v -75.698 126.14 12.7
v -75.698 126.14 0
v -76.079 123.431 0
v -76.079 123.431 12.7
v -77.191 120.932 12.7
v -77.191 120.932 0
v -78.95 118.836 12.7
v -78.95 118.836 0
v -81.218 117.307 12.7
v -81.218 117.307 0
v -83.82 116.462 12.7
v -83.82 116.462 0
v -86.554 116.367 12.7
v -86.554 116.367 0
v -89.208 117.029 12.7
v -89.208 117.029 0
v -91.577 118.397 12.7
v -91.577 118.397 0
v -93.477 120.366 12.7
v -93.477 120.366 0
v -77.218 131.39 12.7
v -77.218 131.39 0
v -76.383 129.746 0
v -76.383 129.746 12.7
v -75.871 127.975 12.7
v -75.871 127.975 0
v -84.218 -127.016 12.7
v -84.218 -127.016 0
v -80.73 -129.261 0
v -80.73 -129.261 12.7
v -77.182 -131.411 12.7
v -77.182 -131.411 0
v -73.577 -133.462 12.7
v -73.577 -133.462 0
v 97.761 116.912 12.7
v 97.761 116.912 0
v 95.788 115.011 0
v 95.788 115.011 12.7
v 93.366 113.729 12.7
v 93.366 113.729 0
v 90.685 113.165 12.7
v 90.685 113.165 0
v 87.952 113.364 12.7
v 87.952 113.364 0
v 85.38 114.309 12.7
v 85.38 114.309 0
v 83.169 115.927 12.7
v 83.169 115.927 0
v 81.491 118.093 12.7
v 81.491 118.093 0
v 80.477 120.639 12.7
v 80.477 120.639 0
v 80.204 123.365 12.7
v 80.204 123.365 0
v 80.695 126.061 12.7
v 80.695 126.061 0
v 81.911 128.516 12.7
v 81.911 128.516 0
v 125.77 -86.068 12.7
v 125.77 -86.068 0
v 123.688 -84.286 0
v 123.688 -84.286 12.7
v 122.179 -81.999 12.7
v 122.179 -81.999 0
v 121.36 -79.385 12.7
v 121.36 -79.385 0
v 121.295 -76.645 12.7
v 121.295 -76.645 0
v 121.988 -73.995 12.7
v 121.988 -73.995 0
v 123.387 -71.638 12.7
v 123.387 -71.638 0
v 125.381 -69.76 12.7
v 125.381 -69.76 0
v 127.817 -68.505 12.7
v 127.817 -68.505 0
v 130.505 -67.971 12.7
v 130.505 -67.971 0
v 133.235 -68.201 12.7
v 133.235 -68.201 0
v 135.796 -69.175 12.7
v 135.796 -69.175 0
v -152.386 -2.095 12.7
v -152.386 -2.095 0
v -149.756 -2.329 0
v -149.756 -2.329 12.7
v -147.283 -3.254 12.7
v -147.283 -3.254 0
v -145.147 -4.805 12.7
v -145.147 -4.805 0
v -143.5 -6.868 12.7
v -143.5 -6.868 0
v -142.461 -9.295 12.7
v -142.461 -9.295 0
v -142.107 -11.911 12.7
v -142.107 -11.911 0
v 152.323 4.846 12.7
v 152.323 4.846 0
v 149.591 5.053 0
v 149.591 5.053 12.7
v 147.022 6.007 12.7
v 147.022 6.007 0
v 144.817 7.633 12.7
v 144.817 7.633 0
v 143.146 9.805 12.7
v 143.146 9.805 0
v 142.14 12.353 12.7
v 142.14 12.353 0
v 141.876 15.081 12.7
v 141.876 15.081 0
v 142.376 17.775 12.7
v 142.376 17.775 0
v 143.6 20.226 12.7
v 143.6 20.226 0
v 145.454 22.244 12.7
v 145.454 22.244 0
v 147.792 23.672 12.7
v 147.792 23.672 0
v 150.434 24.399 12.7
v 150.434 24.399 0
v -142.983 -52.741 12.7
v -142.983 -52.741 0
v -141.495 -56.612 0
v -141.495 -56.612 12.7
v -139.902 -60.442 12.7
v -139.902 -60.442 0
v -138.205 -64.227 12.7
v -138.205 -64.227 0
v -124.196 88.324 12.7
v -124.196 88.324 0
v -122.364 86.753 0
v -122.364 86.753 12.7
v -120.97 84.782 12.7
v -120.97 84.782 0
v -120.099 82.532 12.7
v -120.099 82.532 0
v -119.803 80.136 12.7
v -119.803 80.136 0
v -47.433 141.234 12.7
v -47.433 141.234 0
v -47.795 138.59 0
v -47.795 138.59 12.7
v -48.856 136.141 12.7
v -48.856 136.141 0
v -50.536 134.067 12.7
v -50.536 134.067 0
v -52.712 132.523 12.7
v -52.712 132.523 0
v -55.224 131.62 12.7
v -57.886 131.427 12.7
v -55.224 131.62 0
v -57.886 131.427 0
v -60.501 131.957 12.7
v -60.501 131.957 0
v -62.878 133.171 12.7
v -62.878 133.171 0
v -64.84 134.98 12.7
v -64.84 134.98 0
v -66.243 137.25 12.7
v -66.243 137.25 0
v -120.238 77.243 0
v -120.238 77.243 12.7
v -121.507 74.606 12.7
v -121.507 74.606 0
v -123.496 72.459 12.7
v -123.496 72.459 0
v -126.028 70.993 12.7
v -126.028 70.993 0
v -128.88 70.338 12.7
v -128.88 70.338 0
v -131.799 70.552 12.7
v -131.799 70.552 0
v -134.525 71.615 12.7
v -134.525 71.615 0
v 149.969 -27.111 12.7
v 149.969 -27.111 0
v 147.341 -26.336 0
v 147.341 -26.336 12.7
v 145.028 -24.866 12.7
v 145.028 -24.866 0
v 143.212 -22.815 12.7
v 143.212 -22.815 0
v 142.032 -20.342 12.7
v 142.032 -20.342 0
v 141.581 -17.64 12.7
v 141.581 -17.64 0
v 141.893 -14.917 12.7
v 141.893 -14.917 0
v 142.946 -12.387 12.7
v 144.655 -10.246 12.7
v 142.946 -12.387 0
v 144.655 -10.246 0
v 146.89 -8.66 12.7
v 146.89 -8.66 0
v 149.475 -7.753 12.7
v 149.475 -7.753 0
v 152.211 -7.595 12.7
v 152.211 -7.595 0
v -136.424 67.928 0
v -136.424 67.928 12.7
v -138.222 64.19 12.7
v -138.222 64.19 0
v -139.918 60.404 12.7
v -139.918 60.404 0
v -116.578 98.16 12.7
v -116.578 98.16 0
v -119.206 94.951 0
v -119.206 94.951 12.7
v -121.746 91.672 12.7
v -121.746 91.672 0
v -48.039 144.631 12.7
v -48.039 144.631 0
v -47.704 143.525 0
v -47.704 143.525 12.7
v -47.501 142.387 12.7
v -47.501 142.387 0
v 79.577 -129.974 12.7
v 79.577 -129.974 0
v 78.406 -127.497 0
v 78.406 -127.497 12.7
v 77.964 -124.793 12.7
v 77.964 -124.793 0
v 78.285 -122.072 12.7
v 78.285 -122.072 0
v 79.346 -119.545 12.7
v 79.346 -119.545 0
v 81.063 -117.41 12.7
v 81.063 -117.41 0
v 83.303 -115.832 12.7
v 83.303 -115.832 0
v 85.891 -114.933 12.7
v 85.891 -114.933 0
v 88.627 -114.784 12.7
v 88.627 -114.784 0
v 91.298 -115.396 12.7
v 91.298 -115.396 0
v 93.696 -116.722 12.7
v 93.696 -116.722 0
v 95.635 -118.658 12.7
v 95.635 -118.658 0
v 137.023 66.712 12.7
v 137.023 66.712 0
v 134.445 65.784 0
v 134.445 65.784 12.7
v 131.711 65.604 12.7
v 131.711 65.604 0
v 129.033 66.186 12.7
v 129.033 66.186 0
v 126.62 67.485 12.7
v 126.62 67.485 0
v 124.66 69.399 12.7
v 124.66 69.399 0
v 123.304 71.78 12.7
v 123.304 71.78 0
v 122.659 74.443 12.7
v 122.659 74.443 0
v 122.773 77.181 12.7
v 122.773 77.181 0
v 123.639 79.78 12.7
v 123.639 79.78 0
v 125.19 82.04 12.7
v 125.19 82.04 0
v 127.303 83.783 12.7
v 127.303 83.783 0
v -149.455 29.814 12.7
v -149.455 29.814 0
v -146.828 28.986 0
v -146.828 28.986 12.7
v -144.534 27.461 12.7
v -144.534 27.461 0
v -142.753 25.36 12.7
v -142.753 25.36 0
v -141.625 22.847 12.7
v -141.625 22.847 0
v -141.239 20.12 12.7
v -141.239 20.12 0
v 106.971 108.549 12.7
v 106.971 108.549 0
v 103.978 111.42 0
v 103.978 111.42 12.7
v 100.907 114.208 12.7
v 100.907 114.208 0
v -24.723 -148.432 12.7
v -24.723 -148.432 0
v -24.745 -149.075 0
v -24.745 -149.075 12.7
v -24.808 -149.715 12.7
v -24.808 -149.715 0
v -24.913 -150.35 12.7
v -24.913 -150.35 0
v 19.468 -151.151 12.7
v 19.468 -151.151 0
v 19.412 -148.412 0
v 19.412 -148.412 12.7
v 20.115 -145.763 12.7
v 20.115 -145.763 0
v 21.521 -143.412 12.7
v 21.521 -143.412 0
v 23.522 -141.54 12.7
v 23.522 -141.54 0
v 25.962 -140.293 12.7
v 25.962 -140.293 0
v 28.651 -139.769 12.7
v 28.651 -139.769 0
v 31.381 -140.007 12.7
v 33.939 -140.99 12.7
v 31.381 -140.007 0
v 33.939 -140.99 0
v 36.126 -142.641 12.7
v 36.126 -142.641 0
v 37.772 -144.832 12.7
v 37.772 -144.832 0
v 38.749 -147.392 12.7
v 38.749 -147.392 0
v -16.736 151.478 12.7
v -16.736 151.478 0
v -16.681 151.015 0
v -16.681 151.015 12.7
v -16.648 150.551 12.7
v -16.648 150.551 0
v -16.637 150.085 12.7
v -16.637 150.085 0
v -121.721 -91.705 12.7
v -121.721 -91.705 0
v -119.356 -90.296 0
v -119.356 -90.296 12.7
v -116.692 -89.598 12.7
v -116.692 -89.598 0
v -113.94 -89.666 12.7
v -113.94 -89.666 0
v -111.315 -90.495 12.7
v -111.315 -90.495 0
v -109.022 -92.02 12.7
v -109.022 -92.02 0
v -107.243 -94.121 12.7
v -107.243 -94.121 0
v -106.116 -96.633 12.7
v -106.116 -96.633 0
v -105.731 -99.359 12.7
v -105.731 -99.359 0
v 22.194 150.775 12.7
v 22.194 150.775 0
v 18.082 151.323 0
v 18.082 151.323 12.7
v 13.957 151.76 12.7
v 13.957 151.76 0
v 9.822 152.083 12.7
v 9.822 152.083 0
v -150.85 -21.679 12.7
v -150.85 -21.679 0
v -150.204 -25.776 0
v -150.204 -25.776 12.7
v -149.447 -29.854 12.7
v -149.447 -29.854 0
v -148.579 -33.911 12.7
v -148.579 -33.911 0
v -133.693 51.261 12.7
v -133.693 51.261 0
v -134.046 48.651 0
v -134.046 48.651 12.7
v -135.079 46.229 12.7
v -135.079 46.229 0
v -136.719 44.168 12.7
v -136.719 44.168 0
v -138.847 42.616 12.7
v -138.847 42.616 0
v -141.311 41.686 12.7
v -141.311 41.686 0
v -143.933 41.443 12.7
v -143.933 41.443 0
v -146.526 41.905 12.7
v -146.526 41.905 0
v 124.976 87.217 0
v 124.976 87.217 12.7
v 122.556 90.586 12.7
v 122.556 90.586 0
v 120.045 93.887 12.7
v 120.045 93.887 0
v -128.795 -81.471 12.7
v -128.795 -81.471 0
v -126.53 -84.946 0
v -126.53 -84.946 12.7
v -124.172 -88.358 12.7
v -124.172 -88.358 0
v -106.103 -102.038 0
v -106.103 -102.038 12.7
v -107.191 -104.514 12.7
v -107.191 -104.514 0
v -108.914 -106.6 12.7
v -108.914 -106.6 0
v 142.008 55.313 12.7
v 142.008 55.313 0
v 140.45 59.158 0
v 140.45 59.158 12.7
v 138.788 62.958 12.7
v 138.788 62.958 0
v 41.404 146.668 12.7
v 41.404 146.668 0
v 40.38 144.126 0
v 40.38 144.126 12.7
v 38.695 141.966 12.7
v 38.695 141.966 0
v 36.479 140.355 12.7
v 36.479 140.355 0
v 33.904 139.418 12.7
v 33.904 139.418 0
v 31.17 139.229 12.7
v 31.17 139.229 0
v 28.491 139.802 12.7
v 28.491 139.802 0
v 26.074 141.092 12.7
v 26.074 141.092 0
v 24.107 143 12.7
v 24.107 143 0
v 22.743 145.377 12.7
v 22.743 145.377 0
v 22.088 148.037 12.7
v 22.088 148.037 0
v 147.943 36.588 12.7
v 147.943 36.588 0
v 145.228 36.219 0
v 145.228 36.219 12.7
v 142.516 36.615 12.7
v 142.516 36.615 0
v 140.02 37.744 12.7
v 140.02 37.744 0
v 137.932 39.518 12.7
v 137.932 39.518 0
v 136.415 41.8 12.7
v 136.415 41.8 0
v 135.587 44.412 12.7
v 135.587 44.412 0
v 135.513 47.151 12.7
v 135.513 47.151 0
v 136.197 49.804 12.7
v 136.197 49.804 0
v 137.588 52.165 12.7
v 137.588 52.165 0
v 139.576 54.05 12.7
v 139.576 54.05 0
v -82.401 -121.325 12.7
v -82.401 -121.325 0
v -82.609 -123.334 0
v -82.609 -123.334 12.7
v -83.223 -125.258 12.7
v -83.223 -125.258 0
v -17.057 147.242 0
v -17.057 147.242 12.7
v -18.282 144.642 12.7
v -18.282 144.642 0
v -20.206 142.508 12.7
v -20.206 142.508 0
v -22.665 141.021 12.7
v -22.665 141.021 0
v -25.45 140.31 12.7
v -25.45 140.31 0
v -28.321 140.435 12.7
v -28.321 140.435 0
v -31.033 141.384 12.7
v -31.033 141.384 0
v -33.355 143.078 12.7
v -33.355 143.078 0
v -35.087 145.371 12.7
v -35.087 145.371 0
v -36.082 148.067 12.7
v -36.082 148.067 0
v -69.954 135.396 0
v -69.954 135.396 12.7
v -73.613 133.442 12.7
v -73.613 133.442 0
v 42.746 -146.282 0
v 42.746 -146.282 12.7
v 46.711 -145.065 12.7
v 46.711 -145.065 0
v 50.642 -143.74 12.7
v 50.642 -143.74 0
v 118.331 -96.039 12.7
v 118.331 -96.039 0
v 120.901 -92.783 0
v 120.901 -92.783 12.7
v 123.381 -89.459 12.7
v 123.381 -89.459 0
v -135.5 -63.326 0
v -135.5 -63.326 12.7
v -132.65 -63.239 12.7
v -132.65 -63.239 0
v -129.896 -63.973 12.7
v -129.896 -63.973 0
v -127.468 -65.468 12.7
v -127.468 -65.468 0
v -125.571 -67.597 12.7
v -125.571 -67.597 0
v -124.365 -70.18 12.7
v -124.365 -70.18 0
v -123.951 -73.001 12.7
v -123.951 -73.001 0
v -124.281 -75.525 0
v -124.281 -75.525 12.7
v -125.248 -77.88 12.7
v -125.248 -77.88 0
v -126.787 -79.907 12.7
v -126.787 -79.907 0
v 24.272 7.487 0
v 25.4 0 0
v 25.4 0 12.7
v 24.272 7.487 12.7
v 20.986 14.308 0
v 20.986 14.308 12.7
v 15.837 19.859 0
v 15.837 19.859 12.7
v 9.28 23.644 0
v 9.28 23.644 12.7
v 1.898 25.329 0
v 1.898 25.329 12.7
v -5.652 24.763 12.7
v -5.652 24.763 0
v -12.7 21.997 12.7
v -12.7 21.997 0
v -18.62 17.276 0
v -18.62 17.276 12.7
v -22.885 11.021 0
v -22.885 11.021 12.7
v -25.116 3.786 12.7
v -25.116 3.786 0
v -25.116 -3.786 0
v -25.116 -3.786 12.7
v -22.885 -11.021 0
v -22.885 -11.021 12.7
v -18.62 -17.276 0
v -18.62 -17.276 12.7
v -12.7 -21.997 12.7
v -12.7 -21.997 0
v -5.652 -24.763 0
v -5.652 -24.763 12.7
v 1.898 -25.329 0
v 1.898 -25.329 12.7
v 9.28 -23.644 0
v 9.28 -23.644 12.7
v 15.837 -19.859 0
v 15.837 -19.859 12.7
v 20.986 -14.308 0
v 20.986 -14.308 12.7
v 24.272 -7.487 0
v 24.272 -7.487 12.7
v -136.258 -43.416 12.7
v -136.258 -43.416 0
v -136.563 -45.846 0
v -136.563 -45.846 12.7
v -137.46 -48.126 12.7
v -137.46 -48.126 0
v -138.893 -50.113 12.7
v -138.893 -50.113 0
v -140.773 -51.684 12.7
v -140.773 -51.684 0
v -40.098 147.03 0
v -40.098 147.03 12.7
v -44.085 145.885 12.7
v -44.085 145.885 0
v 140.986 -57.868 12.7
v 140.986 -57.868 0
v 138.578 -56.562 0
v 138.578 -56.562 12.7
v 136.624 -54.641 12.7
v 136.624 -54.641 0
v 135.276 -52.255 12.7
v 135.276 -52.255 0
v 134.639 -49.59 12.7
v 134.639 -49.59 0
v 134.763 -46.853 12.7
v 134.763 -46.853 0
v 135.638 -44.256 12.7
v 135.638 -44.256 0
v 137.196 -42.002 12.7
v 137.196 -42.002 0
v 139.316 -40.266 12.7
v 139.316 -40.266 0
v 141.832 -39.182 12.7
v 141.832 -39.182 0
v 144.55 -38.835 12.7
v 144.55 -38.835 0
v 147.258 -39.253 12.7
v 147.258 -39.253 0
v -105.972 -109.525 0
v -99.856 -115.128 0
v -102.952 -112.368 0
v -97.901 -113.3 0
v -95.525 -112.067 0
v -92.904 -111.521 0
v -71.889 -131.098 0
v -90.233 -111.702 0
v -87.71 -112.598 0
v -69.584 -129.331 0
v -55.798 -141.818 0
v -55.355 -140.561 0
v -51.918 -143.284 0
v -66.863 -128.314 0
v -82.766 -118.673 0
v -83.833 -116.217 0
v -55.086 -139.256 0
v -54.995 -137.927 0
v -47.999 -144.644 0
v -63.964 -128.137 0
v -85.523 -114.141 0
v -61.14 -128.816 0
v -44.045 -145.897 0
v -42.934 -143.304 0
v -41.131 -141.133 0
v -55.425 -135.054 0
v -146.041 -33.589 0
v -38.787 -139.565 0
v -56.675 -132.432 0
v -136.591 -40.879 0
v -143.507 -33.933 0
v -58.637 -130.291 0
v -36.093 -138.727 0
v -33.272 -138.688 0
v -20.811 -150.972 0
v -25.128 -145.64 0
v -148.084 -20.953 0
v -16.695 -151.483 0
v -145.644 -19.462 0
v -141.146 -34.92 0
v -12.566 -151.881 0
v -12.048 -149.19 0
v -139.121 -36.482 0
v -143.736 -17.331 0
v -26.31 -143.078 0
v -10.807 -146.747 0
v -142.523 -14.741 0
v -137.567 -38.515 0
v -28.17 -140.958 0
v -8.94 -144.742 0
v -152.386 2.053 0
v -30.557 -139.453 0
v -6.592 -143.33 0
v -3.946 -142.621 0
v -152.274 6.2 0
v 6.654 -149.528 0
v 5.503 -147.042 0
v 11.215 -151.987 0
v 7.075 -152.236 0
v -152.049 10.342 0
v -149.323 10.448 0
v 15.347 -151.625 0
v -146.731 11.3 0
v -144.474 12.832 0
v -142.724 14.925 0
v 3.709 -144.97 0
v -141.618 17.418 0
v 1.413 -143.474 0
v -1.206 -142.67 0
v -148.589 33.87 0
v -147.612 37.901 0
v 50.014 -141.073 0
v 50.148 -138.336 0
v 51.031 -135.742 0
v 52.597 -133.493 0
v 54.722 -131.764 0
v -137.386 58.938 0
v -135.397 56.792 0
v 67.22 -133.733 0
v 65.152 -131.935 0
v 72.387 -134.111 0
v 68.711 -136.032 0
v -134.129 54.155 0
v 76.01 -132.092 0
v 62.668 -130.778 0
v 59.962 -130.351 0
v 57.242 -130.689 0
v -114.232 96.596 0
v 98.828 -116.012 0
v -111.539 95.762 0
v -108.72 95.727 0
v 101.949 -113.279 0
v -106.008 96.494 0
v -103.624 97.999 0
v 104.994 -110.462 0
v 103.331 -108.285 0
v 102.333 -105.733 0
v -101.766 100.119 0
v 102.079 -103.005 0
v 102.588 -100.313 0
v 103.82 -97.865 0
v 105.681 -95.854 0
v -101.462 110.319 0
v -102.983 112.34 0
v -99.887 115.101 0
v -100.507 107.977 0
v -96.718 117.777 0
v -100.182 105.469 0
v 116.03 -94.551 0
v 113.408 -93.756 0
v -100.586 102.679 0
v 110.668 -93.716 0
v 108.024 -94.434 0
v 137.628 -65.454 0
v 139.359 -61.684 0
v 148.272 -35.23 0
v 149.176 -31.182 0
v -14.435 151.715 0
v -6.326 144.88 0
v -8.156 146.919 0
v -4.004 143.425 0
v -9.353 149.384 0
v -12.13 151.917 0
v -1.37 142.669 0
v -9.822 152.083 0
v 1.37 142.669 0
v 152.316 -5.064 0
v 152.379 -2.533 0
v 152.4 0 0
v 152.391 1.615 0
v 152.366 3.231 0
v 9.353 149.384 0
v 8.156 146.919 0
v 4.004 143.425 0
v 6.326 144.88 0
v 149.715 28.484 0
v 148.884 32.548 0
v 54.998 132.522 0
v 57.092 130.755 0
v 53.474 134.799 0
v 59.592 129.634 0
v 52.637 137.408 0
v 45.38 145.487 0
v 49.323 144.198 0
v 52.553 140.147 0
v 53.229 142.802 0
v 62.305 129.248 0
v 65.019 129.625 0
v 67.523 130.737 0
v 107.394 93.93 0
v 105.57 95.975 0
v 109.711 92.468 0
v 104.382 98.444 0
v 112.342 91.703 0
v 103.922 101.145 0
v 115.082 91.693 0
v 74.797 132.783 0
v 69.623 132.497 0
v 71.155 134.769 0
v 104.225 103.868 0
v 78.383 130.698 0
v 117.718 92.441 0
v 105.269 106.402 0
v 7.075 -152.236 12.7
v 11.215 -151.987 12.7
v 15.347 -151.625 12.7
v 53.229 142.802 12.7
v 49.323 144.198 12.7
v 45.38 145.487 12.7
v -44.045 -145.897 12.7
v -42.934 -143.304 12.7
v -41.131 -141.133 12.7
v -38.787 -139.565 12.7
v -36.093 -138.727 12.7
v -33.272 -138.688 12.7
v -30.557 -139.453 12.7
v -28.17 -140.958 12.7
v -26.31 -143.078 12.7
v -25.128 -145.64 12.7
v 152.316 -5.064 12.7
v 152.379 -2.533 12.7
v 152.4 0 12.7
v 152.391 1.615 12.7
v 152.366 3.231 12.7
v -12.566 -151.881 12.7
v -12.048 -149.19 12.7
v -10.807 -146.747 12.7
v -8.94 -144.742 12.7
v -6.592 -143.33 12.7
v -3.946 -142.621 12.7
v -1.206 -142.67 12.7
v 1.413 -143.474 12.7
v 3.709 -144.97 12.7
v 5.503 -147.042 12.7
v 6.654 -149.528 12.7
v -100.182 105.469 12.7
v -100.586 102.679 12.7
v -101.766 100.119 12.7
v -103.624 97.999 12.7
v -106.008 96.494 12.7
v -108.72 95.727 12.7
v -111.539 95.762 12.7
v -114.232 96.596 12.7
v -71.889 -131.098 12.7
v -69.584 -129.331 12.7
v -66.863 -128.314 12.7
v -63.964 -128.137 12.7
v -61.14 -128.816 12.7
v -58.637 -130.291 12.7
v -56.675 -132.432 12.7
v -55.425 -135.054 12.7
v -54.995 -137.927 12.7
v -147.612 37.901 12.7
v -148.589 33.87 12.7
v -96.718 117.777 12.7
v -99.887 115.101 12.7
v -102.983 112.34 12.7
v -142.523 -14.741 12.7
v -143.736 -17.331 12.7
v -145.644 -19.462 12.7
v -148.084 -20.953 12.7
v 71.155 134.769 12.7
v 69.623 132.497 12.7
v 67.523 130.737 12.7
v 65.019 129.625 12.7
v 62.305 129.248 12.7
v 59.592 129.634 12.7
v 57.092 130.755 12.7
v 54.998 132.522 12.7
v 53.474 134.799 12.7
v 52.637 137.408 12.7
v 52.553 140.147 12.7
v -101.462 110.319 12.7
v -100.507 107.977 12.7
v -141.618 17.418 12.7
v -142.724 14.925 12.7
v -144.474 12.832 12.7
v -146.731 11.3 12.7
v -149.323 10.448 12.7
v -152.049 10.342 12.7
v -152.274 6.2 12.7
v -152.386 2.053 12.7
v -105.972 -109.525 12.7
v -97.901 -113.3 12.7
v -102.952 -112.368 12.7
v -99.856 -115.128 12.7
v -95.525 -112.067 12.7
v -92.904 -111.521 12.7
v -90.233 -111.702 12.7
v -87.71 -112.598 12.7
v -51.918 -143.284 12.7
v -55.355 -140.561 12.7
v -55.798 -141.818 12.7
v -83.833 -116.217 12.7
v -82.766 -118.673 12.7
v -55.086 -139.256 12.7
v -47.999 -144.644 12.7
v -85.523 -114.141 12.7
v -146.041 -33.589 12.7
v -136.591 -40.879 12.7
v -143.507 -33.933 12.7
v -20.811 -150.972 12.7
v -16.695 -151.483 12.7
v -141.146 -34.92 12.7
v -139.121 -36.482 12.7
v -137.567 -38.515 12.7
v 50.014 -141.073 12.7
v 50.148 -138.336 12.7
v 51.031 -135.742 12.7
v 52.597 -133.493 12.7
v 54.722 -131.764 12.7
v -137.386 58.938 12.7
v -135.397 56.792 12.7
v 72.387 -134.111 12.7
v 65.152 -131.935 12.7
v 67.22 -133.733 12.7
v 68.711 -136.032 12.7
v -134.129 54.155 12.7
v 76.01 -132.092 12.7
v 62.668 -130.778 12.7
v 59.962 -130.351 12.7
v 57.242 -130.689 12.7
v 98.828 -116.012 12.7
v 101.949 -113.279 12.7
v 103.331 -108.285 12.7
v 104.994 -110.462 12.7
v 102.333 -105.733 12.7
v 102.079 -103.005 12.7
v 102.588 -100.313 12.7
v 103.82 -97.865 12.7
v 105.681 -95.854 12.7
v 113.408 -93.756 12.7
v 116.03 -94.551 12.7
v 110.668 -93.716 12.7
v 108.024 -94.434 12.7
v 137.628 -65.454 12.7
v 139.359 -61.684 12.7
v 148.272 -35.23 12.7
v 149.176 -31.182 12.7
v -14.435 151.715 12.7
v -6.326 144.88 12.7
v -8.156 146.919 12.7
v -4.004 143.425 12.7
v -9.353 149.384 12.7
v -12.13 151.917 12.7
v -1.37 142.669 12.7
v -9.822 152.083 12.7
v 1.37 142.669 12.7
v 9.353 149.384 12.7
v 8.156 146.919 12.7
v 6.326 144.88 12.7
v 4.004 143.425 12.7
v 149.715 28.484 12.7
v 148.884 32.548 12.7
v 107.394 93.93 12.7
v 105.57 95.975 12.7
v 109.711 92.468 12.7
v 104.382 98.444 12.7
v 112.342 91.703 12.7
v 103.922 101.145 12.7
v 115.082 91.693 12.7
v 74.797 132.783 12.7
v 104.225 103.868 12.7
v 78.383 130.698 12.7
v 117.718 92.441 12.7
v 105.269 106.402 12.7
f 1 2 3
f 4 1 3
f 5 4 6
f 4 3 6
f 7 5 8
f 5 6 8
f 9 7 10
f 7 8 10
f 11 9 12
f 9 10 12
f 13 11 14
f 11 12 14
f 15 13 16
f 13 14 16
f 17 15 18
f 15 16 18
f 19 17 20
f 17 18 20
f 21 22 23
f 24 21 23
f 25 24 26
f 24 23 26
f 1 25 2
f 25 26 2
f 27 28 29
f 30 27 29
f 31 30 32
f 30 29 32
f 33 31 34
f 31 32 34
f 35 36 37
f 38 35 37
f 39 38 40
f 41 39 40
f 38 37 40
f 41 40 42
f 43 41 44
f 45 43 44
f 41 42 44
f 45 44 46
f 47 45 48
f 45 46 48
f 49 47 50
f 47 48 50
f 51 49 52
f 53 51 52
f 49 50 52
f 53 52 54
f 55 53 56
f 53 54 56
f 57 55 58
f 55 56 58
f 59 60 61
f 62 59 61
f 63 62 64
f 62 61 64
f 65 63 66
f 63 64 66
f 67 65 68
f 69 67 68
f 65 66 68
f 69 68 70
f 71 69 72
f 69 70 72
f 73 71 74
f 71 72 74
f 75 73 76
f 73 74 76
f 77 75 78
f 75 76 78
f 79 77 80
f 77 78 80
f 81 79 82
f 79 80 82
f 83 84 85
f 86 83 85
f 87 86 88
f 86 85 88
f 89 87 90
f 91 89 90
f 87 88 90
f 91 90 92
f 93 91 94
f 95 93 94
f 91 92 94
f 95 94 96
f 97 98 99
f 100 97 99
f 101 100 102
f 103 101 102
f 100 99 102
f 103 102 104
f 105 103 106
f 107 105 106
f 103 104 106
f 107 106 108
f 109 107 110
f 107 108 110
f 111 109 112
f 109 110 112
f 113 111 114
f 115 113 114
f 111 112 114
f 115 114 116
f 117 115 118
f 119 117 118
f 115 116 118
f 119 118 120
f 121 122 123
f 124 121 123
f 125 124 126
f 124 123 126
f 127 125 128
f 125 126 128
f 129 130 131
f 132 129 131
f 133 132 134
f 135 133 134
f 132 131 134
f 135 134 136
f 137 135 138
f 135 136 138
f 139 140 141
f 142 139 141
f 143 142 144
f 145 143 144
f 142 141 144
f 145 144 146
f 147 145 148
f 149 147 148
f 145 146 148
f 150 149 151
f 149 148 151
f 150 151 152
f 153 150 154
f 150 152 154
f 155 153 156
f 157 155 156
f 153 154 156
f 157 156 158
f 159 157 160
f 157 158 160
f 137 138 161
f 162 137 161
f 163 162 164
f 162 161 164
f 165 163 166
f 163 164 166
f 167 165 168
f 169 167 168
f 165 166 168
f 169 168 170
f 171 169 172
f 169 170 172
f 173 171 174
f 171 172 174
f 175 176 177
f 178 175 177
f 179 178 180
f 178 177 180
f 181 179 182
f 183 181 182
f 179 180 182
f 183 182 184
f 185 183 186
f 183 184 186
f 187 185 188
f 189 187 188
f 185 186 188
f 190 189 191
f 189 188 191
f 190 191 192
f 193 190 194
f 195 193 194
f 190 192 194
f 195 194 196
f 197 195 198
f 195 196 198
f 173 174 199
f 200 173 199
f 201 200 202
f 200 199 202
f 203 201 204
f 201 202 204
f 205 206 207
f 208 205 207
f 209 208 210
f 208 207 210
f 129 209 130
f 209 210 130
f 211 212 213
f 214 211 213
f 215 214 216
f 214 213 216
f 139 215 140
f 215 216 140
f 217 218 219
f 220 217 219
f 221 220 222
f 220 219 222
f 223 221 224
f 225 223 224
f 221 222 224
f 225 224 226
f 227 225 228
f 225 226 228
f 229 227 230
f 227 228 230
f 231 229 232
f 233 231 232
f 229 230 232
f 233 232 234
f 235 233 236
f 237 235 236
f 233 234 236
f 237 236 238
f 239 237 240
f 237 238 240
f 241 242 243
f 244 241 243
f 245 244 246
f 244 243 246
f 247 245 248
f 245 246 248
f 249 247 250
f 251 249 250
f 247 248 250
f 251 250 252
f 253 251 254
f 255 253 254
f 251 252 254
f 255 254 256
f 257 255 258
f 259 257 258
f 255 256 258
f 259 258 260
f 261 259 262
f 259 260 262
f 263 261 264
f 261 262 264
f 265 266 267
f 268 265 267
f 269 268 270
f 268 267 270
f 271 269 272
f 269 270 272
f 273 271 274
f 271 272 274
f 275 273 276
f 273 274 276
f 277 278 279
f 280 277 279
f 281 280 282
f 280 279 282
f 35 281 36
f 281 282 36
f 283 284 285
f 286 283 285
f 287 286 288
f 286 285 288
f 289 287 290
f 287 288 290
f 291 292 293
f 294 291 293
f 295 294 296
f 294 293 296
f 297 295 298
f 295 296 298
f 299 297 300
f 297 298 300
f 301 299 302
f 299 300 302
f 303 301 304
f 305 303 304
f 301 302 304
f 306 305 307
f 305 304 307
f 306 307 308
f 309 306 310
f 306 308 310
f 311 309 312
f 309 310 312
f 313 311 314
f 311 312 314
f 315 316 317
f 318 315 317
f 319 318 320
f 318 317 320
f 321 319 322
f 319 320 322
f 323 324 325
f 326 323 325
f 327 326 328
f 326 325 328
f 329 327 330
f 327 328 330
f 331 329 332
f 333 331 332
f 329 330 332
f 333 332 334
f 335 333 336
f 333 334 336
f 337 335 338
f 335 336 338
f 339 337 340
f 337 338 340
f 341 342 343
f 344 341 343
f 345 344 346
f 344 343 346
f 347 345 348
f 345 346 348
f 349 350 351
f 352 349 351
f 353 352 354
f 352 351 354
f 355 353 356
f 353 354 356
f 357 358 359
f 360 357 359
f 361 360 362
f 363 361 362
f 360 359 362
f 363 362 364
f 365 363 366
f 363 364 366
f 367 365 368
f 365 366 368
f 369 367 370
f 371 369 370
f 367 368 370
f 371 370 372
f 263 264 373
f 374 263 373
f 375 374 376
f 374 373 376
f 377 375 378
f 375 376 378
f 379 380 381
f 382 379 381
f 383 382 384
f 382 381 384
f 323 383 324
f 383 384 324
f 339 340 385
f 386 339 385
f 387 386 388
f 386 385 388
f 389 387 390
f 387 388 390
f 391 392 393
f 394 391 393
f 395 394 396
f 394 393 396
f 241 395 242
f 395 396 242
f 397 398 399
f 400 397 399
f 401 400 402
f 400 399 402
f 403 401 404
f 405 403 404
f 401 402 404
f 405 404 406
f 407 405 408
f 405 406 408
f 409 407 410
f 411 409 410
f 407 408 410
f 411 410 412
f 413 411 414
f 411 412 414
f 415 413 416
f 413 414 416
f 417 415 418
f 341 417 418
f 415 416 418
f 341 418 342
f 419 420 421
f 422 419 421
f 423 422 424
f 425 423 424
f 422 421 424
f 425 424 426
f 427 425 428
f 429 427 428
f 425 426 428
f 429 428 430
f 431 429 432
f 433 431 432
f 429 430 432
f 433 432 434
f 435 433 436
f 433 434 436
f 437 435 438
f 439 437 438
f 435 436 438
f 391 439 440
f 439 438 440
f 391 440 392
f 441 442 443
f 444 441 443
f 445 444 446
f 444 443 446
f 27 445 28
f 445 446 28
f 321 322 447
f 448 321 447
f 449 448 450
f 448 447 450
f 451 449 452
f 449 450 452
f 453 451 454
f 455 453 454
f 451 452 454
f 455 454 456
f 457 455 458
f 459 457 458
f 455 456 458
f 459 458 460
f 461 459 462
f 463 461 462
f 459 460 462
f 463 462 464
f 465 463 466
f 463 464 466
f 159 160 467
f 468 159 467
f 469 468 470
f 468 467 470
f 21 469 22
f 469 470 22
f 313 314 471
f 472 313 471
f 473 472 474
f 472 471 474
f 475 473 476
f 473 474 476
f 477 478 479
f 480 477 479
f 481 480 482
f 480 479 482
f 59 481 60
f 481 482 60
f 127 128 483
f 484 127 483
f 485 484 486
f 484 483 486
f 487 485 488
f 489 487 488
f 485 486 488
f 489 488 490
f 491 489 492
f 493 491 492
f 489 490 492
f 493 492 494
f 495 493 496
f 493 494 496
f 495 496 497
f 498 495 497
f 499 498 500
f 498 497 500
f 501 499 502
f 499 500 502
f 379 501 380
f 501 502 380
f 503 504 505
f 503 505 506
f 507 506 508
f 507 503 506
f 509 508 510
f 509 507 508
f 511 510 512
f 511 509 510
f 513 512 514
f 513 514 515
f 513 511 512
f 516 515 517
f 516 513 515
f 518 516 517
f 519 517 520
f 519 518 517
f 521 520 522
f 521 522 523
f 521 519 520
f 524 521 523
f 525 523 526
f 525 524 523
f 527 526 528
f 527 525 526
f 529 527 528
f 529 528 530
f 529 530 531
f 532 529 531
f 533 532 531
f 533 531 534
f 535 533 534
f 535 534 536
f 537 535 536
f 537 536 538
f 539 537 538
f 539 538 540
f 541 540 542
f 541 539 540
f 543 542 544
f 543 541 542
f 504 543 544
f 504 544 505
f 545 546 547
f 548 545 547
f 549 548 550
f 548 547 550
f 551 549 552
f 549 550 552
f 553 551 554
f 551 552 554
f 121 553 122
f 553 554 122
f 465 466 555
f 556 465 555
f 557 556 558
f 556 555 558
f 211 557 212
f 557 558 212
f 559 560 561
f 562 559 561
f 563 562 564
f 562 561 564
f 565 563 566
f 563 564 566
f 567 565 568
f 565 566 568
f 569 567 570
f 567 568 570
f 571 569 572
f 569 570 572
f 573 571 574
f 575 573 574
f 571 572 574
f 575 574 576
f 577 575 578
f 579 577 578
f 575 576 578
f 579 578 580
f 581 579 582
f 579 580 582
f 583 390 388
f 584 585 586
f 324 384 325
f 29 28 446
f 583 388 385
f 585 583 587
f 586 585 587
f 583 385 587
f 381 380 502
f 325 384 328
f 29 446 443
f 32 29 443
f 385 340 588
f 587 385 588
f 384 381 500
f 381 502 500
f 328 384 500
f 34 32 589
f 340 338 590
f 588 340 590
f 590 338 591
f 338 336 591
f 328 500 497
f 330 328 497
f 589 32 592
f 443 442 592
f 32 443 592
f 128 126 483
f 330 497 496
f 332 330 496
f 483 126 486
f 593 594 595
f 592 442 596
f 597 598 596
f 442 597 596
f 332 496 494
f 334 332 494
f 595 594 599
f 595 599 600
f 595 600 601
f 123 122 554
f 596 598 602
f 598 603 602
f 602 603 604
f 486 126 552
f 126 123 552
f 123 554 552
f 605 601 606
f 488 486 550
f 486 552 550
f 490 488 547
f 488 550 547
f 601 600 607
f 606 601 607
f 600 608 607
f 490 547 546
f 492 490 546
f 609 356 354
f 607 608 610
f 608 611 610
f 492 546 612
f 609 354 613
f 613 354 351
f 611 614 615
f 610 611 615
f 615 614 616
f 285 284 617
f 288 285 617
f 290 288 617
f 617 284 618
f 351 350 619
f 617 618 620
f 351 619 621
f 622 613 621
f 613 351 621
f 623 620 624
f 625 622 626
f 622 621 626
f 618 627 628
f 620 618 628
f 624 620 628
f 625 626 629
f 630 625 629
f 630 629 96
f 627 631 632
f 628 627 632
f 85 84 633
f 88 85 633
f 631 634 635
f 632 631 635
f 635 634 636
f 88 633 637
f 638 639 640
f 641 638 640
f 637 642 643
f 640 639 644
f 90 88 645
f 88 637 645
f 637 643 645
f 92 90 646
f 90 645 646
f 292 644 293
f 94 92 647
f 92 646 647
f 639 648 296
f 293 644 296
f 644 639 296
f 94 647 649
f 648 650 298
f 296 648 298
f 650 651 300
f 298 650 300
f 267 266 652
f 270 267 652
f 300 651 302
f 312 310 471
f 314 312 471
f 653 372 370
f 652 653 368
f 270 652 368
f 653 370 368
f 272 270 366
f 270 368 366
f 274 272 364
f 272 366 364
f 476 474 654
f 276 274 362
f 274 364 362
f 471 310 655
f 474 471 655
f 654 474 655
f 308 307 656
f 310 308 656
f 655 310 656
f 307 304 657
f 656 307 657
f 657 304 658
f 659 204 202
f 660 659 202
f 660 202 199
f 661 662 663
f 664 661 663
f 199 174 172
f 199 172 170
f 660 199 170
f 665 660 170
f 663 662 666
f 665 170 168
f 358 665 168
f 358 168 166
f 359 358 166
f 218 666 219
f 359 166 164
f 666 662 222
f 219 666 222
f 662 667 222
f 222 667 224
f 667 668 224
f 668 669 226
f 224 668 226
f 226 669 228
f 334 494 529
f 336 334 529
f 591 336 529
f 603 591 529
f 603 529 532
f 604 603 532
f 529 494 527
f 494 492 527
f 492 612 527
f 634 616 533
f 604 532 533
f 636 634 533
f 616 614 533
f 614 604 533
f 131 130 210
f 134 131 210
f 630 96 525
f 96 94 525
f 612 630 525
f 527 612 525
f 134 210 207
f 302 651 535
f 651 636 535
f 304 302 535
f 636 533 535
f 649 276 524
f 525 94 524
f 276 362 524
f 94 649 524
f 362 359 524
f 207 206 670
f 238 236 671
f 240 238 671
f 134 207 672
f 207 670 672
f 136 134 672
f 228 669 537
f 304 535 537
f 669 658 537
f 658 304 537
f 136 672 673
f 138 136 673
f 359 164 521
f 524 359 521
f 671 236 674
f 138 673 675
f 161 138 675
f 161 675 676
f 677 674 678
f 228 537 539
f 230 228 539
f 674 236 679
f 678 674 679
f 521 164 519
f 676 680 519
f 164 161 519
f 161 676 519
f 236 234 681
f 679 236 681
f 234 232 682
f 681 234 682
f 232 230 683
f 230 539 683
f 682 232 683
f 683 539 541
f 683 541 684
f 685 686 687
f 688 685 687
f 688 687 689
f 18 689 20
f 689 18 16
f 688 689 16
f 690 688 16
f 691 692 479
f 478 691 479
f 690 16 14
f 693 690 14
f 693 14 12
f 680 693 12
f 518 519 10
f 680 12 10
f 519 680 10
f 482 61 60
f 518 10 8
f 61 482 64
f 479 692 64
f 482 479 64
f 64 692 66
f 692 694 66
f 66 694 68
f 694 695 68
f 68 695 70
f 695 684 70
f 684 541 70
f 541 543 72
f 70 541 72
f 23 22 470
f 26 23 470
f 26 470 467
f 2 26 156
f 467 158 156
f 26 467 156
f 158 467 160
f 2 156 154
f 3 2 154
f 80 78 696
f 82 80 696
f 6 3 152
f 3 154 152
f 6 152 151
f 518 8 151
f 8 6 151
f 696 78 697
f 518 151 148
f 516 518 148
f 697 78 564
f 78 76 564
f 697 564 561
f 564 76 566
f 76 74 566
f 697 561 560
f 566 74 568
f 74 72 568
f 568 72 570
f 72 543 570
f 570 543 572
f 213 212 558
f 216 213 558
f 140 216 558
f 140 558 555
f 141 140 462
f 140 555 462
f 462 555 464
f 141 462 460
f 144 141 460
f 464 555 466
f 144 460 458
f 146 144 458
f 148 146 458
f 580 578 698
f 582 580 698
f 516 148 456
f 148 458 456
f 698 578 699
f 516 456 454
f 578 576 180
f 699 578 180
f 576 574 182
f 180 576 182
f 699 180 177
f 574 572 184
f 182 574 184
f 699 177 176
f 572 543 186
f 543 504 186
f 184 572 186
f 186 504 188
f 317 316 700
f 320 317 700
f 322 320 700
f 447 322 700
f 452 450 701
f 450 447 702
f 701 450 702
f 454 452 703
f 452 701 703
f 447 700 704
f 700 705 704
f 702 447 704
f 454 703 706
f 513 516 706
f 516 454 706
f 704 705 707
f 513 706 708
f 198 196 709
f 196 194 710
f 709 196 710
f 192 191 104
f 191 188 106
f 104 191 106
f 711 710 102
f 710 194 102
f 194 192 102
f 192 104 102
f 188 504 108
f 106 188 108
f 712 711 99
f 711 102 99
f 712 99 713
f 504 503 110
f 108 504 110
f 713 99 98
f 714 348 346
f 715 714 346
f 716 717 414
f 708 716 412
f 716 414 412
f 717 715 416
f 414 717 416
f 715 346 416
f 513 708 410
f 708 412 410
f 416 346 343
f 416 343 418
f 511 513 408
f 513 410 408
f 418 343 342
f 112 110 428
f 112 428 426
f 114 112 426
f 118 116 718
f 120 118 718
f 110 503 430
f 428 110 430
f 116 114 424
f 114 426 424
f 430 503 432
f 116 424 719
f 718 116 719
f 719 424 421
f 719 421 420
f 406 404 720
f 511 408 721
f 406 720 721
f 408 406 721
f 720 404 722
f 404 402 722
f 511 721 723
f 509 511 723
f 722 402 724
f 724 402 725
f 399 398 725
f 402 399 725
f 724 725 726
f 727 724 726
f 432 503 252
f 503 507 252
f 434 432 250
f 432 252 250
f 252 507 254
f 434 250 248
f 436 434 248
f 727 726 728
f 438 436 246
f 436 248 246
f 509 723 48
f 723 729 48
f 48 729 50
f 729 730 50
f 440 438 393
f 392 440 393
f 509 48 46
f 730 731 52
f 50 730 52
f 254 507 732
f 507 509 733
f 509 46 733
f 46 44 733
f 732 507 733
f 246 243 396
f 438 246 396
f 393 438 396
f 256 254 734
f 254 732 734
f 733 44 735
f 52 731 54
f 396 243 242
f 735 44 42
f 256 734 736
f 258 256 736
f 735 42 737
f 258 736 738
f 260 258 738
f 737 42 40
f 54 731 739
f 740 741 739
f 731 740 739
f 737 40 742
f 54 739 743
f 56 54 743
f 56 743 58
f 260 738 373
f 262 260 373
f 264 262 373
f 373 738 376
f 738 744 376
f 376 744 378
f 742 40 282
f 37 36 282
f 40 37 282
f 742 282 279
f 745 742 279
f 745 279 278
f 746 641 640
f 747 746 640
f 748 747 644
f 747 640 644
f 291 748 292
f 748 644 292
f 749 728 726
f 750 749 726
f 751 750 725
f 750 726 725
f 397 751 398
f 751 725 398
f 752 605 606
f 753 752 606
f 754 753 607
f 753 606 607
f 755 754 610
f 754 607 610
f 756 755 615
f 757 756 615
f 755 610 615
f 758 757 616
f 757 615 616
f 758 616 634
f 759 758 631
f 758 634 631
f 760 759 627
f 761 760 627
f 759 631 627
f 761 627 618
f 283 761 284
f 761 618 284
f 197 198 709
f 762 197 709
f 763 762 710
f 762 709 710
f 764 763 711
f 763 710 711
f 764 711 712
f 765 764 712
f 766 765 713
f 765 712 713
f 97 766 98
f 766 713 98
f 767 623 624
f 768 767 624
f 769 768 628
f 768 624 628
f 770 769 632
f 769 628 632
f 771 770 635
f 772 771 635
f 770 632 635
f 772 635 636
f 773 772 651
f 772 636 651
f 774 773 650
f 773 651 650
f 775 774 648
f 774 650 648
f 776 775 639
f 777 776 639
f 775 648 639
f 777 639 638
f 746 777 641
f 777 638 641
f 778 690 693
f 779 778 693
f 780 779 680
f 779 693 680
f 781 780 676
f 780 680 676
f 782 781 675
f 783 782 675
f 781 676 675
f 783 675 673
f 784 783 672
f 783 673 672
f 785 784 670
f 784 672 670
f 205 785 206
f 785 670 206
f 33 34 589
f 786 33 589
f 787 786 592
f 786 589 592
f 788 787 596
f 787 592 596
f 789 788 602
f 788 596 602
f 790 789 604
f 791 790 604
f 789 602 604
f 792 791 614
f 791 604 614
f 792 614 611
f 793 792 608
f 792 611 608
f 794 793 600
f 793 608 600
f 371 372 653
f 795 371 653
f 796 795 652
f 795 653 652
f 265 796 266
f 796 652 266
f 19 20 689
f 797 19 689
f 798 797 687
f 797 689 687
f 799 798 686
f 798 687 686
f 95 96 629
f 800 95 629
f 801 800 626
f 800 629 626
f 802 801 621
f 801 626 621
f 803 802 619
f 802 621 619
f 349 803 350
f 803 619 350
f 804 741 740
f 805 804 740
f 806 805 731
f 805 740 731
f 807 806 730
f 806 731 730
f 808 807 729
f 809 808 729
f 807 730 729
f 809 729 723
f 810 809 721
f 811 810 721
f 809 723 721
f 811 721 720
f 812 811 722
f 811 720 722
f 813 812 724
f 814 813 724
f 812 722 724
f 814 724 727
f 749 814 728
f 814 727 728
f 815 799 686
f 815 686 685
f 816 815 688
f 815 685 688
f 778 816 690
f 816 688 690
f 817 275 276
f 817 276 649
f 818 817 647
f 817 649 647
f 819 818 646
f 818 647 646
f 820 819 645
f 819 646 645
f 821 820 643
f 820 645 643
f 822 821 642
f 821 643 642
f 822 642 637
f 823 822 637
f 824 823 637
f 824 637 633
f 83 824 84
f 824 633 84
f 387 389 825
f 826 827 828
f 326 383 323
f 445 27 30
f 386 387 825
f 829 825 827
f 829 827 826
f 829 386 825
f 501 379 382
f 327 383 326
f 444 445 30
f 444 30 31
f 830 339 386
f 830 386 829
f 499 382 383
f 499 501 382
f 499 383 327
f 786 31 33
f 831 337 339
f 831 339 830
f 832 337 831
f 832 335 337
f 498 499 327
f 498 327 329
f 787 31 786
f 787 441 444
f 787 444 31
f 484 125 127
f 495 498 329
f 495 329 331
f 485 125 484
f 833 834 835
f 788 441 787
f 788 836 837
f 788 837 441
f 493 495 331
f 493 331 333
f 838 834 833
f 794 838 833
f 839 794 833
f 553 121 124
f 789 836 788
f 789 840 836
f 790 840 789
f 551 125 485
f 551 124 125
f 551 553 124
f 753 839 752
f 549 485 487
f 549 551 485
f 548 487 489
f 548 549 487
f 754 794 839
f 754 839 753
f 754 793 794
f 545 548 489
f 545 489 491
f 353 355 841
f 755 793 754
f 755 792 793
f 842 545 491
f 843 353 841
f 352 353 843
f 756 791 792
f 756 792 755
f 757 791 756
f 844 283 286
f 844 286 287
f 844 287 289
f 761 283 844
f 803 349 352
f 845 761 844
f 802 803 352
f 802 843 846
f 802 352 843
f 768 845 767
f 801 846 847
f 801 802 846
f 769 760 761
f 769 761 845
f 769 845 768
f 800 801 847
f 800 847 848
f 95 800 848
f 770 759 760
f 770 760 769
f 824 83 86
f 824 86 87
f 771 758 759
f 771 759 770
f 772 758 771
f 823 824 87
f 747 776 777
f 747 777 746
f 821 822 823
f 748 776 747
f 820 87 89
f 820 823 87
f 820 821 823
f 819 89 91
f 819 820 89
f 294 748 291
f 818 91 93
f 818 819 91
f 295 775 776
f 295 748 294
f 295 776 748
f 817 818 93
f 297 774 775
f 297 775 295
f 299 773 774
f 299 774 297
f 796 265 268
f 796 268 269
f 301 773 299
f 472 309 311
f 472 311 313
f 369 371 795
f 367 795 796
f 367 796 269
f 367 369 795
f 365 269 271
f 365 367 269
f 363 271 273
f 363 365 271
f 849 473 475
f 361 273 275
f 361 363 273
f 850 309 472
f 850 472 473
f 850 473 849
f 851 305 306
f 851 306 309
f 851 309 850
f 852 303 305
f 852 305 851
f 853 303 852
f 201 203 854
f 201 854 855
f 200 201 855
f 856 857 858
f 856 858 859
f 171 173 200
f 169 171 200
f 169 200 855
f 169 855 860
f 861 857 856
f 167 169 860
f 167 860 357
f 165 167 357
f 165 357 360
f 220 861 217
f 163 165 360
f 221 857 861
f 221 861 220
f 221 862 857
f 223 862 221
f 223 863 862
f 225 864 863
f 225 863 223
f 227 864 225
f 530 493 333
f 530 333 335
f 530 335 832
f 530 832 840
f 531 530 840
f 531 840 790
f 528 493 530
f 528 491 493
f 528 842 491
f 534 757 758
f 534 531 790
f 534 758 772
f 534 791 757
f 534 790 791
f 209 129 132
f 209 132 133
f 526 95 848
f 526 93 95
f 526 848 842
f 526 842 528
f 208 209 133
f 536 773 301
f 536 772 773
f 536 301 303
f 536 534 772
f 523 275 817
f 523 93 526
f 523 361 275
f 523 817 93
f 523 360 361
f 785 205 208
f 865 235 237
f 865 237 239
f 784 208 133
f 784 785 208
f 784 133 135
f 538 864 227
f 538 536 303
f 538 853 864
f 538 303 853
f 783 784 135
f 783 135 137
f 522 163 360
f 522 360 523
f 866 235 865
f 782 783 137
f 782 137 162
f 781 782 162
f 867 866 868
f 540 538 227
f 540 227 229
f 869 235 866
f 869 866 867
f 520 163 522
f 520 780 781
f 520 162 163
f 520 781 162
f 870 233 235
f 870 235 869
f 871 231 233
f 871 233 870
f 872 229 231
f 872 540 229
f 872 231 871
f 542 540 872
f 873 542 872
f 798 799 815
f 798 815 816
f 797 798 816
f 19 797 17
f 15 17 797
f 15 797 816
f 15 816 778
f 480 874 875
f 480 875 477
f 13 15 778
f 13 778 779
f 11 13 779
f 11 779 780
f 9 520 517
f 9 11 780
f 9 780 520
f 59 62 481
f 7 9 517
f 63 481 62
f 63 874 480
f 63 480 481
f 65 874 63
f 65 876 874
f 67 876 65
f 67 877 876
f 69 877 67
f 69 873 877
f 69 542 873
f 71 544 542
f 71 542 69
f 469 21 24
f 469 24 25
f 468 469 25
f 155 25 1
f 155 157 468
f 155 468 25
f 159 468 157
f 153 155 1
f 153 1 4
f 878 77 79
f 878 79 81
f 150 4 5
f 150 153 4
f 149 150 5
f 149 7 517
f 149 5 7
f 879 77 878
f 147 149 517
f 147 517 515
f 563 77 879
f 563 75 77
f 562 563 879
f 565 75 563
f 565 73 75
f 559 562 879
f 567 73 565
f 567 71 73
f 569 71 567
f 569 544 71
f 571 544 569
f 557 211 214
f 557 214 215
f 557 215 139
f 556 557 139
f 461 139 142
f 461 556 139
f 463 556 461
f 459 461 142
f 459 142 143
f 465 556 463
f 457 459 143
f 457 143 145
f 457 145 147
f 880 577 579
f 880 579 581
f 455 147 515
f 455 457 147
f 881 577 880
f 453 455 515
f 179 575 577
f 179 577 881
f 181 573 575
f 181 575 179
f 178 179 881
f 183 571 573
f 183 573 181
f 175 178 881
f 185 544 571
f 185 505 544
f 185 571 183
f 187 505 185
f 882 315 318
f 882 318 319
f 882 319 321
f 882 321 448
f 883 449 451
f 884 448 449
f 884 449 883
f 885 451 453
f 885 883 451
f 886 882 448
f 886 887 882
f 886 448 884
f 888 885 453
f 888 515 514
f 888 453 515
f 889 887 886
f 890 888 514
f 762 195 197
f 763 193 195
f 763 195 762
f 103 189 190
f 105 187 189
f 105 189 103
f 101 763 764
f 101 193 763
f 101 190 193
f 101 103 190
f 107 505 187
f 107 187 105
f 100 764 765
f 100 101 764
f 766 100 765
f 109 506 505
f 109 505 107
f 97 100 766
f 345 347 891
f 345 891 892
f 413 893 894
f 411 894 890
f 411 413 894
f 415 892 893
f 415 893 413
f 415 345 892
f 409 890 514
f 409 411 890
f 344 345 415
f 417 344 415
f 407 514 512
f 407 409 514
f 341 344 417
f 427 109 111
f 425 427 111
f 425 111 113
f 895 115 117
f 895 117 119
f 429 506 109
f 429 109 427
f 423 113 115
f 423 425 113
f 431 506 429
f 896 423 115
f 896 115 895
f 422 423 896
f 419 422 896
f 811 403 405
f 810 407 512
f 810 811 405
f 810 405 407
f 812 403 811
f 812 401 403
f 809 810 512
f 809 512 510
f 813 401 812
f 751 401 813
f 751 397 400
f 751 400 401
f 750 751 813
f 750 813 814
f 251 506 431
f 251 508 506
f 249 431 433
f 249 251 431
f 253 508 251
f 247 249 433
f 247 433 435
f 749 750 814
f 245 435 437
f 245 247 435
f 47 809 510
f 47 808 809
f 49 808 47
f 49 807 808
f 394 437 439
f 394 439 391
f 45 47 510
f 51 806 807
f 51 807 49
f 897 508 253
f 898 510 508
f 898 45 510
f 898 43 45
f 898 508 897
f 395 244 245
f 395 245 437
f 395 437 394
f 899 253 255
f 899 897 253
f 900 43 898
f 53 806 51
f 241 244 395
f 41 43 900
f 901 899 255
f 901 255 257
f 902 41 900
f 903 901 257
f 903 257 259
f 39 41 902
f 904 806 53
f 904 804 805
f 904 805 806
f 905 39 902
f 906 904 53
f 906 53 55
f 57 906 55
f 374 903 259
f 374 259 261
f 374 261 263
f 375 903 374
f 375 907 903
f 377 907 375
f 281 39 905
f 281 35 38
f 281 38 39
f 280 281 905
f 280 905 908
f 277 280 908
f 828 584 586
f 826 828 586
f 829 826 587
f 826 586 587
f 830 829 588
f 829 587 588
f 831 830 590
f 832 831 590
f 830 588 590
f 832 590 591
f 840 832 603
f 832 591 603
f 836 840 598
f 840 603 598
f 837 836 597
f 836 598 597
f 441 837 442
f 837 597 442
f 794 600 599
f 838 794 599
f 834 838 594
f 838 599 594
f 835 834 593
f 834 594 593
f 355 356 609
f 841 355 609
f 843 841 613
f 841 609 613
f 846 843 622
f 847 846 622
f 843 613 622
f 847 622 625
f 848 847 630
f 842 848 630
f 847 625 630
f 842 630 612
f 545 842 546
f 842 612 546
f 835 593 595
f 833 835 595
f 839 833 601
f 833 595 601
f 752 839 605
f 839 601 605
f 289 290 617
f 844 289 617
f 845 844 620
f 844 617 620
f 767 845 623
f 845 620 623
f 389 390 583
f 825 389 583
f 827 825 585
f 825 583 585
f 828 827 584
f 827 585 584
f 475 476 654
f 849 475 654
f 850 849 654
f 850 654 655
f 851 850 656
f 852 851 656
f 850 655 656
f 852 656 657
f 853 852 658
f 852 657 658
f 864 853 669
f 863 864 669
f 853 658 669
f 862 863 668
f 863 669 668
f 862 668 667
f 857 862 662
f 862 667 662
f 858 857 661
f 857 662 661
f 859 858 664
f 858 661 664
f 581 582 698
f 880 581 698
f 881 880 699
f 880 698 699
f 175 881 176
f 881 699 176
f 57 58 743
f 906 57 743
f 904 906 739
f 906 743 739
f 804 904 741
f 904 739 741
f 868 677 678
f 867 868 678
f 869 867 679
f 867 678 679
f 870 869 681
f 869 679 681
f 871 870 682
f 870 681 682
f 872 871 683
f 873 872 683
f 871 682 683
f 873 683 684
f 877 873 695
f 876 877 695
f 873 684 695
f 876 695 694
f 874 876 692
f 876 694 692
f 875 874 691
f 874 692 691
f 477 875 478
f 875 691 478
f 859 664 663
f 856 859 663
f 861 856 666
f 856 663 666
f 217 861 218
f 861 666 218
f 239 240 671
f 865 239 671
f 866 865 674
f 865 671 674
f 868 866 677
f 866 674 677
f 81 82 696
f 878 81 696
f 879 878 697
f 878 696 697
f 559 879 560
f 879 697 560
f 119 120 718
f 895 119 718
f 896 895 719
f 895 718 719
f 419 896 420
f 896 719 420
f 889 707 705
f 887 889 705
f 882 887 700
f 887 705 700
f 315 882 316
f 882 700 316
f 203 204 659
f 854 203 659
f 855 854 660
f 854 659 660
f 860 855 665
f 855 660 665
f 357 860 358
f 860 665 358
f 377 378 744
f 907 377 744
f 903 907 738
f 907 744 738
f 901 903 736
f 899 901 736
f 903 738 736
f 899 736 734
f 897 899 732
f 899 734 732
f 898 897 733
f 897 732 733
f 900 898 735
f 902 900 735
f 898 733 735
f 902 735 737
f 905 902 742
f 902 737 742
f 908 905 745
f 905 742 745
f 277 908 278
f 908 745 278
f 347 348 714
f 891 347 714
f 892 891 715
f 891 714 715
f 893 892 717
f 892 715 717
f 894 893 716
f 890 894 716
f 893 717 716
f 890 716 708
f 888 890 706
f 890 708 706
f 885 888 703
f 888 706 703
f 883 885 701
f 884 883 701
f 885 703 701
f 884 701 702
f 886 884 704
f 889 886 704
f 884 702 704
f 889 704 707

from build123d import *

# Parameters (mm, degrees)
F0_R     = 25.4
F1_DEPTH = 12.7


with BuildPart() as f1:
    # F0 (on Top) → F1 (new body)
    with BuildSketch(Plane.XY):
        with BuildLine():
            ThreePointArc((152.210637, -7.594865), (152.352652, -3.798613), (152.4, 0))
            ThreePointArc((152.4, 0), (152.380736, 2.423103), (152.322947, 4.845593))
            ThreePointArc((152.322947, 4.845593), (141.912408, 13.707712), (150.434272, 24.398564))
            ThreePointArc((150.434272, 24.398564), (149.313035, 30.518479), (147.942937, 36.587529))
            ThreePointArc((147.942937, 36.587529), (135.909535, 43.077036), (142.007699, 55.313412))
            ThreePointArc((142.007699, 55.313412), (139.631639, 61.063618), (137.022854, 66.712049))
            ThreePointArc((137.022854, 66.712049), (123.898547, 70.542066), (127.30343, 83.783034))
            ThreePointArc((127.30343, 83.783034), (123.777584, 88.909334), (120.045438, 93.887448))
            ThreePointArc((120.045438, 93.887448), (106.410408, 94.888661), (106.971492, 108.548883))
            ThreePointArc((106.971492, 108.548883), (102.451727, 112.824659), (97.761205, 116.912389))
            ThreePointArc((97.761205, 116.912389), (84.218213, 115.040539), (81.910694, 128.51614))
            ThreePointArc((81.910694, 128.51614), (76.596814, 131.752374), (71.155269, 134.769016))
            ThreePointArc((71.155269, 134.769016), (58.303006, 130.10685), (53.228892, 142.802119))
            ThreePointArc((53.228892, 142.802119), (47.355806, 144.855748), (41.403792, 146.667945))
            ThreePointArc((41.403792, 146.667945), (29.810413, 139.421563), (22.194015, 150.775282))
            ThreePointArc((22.194015, 150.775282), (16.021353, 151.555522), (9.821987, 152.083163))
            ThreePointArc((9.821987, 152.083163), (0, 142.572904), (-9.821987, 152.083163))
            ThreePointArc((-9.821987, 152.083163), (-13.282535, 151.820072), (-16.736195, 151.478249))
            ThreePointArc((-16.736195, 151.478249), (-16.661745, 150.783242), (-16.636886, 150.084702))
            ThreePointArc((-16.636886, 150.084702), (-25.44977, 140.310082), (-36.081733, 148.067108))
            ThreePointArc((-36.081733, 148.067108), (-42.095292, 146.470974), (-48.038691, 144.630717))
            ThreePointArc((-48.038691, 144.630717), (-47.5856, 142.959149), (-47.43299, 141.233999))
            ThreePointArc((-47.43299, 141.233999), (-55.223917, 131.620163), (-66.243396, 137.250036))
            ThreePointArc((-66.243396, 137.250036), (-71.790301, 134.431814), (-77.217553, 131.389533))
            ThreePointArc((-77.217553, 131.389533), (-76.085391, 128.872443), (-75.697812, 126.139803))
            ThreePointArc((-75.697812, 126.139803), (-82.489349, 116.793296), (-93.476655, 120.365589))
            ThreePointArc((-93.476655, 120.365589), (-98.311696, 116.449862), (-102.98288, 112.340048))
            ThreePointArc((-102.98288, 112.340048), (-100.909017, 109.179225), (-100.181858, 105.469379))
            ThreePointArc((-100.181858, 105.469379), (-106.007645, 96.493782), (-116.577616, 98.160172))
            ThreePointArc((-116.577616, 98.160172), (-120.487052, 93.320043), (-124.19567, 88.324377))
            ThreePointArc((-124.19567, 88.324377), (-120.970356, 84.782436), (-119.802768, 80.136498))
            ThreePointArc((-119.802768, 80.136498), (-124.707149, 71.631282), (-134.525062, 71.615415))
            ThreePointArc((-134.525062, 71.615415), (-137.336068, 66.064849), (-139.918176, 60.404173))
            ThreePointArc((-139.918176, 60.404173), (-135.39715, 56.791586), (-133.693165, 51.261044))
            ThreePointArc((-133.693165, 51.261044), (-137.730696, 43.320467), (-146.525595, 41.904774))
            ThreePointArc((-146.525595, 41.904774), (-148.113906, 35.889145), (-149.455356, 29.813698))
            ThreePointArc((-149.455356, 29.813698), (-143.569406, 26.473362), (-141.239, 20.119508))
            ThreePointArc((-141.239, 20.119508), (-144.473844, 12.83157), (-152.048709, 10.341661))
            ThreePointArc((-152.048709, 10.341661), (-152.344113, 4.126898), (-152.385603, -2.094742))
            ThreePointArc((-152.385603, -2.094742), (-145.146605, -4.804697), (-142.106697, -11.911447))
            ThreePointArc((-142.106697, -11.911447), (-144.611911, -18.465977), (-150.850248, -21.678624))
            ThreePointArc((-150.850248, -21.678624), (-149.839684, -27.817785), (-148.579381, -33.910582))
            ThreePointArc((-148.579381, -33.910582), (-140.082526, -35.634948), (-136.257897, -43.415835))
            ThreePointArc((-136.257897, -43.415835), (-138.114625, -49.164318), (-142.98319, -52.740568))
            ThreePointArc((-142.98319, -52.740568), (-140.711332, -58.532735), (-138.20495, -64.227345))
            ThreePointArc((-138.20495, -64.227345), (-128.627028, -64.632158), (-123.951157, -73.000952))
            ThreePointArc((-123.951157, -73.000952), (-125.24773, -77.87968), (-128.795312, -81.471023))
            ThreePointArc((-128.795312, -81.471023), (-125.362592, -86.660144), (-121.72093, -91.704827))
            ThreePointArc((-121.72093, -91.704827), (-111.314719, -90.494981), (-105.730518, -99.358934))
            ThreePointArc((-105.730518, -99.358934), (-106.561474, -103.31384), (-108.913814, -106.599911))
            ThreePointArc((-108.913814, -106.599911), (-104.471982, -110.956591), (-99.856025, -115.128338))
            ThreePointArc((-99.856025, -115.128338), (-88.941006, -112.063704), (-82.401454, -121.324583))
            ThreePointArc((-82.401454, -121.324583), (-82.866492, -124.311837), (-84.217593, -127.016365))
            ThreePointArc((-84.217593, -127.016365), (-78.963006, -130.34801), (-73.576812, -133.462402))
            ThreePointArc((-73.576812, -133.462402), (-62.526605, -128.371697), (-54.995268, -137.926869))
            ThreePointArc((-54.995268, -137.926869), (-55.198142, -139.913365), (-55.798387, -141.817841))
            ThreePointArc((-55.798387, -141.817841), (-49.963335, -143.977169), (-44.045008, -145.896529))
            ThreePointArc((-44.045008, -145.896529), (-33.272061, -138.688287), (-24.723496, -148.431858))
            ThreePointArc((-24.723496, -148.431858), (-24.770866, -149.395581), (-24.912517, -150.350013))
            ThreePointArc((-24.912517, -150.350013), (-18.754947, -151.241568), (-12.566119, -151.881048))
            ThreePointArc((-12.566119, -151.881048), (-2.574032, -142.549666), (7.074654, -152.235703))
            ThreePointArc((7.074654, -152.235703), (13.282535, -151.820072), (19.468278, -151.151401))
            ThreePointArc((19.468278, -151.151401), (27.288417, -139.93704), (38.749078, -147.39155))
            ThreePointArc((38.749078, -147.39155), (44.73284, -145.687107), (50.642046, -143.739846))
            ThreePointArc((50.642046, -143.739846), (55.944534, -131.138255), (68.710532, -136.031698))
            ThreePointArc((68.710532, -136.031698), (74.205652, -133.11379), (79.577094, -129.974021))
            ThreePointArc((79.577094, -129.974021), (82.127527, -116.542276), (95.634518, -118.658329))
            ThreePointArc((95.634518, -118.658329), (100.398075, -114.655948), (104.994299, -110.46247))
            ThreePointArc((104.994299, -110.46247), (104.67993, -96.794345), (118.330814, -96.039463))
            ThreePointArc((118.330814, -96.039463), (122.152227, -91.129542), (125.770049, -86.067734))
            ThreePointArc((125.770049, -86.067734), (122.604775, -72.767451), (135.796091, -69.175007))
            ThreePointArc((135.796091, -69.175007), (138.506429, -63.574596), (140.985916, -57.868224))
            ThreePointArc((140.985916, -57.868224), (135.109664, -45.523746), (147.258268, -39.252549))
            ThreePointArc((147.258268, -39.252549), (148.737713, -33.209225), (149.969257, -27.11055))
            ThreePointArc((149.969257, -27.11055), (141.641797, -16.267586), (152.210637, -7.594865))
        make_face()
        Circle(F0_R, mode=Mode.SUBTRACT)
    extrude(amount=F1_DEPTH)


solid = f1.part
